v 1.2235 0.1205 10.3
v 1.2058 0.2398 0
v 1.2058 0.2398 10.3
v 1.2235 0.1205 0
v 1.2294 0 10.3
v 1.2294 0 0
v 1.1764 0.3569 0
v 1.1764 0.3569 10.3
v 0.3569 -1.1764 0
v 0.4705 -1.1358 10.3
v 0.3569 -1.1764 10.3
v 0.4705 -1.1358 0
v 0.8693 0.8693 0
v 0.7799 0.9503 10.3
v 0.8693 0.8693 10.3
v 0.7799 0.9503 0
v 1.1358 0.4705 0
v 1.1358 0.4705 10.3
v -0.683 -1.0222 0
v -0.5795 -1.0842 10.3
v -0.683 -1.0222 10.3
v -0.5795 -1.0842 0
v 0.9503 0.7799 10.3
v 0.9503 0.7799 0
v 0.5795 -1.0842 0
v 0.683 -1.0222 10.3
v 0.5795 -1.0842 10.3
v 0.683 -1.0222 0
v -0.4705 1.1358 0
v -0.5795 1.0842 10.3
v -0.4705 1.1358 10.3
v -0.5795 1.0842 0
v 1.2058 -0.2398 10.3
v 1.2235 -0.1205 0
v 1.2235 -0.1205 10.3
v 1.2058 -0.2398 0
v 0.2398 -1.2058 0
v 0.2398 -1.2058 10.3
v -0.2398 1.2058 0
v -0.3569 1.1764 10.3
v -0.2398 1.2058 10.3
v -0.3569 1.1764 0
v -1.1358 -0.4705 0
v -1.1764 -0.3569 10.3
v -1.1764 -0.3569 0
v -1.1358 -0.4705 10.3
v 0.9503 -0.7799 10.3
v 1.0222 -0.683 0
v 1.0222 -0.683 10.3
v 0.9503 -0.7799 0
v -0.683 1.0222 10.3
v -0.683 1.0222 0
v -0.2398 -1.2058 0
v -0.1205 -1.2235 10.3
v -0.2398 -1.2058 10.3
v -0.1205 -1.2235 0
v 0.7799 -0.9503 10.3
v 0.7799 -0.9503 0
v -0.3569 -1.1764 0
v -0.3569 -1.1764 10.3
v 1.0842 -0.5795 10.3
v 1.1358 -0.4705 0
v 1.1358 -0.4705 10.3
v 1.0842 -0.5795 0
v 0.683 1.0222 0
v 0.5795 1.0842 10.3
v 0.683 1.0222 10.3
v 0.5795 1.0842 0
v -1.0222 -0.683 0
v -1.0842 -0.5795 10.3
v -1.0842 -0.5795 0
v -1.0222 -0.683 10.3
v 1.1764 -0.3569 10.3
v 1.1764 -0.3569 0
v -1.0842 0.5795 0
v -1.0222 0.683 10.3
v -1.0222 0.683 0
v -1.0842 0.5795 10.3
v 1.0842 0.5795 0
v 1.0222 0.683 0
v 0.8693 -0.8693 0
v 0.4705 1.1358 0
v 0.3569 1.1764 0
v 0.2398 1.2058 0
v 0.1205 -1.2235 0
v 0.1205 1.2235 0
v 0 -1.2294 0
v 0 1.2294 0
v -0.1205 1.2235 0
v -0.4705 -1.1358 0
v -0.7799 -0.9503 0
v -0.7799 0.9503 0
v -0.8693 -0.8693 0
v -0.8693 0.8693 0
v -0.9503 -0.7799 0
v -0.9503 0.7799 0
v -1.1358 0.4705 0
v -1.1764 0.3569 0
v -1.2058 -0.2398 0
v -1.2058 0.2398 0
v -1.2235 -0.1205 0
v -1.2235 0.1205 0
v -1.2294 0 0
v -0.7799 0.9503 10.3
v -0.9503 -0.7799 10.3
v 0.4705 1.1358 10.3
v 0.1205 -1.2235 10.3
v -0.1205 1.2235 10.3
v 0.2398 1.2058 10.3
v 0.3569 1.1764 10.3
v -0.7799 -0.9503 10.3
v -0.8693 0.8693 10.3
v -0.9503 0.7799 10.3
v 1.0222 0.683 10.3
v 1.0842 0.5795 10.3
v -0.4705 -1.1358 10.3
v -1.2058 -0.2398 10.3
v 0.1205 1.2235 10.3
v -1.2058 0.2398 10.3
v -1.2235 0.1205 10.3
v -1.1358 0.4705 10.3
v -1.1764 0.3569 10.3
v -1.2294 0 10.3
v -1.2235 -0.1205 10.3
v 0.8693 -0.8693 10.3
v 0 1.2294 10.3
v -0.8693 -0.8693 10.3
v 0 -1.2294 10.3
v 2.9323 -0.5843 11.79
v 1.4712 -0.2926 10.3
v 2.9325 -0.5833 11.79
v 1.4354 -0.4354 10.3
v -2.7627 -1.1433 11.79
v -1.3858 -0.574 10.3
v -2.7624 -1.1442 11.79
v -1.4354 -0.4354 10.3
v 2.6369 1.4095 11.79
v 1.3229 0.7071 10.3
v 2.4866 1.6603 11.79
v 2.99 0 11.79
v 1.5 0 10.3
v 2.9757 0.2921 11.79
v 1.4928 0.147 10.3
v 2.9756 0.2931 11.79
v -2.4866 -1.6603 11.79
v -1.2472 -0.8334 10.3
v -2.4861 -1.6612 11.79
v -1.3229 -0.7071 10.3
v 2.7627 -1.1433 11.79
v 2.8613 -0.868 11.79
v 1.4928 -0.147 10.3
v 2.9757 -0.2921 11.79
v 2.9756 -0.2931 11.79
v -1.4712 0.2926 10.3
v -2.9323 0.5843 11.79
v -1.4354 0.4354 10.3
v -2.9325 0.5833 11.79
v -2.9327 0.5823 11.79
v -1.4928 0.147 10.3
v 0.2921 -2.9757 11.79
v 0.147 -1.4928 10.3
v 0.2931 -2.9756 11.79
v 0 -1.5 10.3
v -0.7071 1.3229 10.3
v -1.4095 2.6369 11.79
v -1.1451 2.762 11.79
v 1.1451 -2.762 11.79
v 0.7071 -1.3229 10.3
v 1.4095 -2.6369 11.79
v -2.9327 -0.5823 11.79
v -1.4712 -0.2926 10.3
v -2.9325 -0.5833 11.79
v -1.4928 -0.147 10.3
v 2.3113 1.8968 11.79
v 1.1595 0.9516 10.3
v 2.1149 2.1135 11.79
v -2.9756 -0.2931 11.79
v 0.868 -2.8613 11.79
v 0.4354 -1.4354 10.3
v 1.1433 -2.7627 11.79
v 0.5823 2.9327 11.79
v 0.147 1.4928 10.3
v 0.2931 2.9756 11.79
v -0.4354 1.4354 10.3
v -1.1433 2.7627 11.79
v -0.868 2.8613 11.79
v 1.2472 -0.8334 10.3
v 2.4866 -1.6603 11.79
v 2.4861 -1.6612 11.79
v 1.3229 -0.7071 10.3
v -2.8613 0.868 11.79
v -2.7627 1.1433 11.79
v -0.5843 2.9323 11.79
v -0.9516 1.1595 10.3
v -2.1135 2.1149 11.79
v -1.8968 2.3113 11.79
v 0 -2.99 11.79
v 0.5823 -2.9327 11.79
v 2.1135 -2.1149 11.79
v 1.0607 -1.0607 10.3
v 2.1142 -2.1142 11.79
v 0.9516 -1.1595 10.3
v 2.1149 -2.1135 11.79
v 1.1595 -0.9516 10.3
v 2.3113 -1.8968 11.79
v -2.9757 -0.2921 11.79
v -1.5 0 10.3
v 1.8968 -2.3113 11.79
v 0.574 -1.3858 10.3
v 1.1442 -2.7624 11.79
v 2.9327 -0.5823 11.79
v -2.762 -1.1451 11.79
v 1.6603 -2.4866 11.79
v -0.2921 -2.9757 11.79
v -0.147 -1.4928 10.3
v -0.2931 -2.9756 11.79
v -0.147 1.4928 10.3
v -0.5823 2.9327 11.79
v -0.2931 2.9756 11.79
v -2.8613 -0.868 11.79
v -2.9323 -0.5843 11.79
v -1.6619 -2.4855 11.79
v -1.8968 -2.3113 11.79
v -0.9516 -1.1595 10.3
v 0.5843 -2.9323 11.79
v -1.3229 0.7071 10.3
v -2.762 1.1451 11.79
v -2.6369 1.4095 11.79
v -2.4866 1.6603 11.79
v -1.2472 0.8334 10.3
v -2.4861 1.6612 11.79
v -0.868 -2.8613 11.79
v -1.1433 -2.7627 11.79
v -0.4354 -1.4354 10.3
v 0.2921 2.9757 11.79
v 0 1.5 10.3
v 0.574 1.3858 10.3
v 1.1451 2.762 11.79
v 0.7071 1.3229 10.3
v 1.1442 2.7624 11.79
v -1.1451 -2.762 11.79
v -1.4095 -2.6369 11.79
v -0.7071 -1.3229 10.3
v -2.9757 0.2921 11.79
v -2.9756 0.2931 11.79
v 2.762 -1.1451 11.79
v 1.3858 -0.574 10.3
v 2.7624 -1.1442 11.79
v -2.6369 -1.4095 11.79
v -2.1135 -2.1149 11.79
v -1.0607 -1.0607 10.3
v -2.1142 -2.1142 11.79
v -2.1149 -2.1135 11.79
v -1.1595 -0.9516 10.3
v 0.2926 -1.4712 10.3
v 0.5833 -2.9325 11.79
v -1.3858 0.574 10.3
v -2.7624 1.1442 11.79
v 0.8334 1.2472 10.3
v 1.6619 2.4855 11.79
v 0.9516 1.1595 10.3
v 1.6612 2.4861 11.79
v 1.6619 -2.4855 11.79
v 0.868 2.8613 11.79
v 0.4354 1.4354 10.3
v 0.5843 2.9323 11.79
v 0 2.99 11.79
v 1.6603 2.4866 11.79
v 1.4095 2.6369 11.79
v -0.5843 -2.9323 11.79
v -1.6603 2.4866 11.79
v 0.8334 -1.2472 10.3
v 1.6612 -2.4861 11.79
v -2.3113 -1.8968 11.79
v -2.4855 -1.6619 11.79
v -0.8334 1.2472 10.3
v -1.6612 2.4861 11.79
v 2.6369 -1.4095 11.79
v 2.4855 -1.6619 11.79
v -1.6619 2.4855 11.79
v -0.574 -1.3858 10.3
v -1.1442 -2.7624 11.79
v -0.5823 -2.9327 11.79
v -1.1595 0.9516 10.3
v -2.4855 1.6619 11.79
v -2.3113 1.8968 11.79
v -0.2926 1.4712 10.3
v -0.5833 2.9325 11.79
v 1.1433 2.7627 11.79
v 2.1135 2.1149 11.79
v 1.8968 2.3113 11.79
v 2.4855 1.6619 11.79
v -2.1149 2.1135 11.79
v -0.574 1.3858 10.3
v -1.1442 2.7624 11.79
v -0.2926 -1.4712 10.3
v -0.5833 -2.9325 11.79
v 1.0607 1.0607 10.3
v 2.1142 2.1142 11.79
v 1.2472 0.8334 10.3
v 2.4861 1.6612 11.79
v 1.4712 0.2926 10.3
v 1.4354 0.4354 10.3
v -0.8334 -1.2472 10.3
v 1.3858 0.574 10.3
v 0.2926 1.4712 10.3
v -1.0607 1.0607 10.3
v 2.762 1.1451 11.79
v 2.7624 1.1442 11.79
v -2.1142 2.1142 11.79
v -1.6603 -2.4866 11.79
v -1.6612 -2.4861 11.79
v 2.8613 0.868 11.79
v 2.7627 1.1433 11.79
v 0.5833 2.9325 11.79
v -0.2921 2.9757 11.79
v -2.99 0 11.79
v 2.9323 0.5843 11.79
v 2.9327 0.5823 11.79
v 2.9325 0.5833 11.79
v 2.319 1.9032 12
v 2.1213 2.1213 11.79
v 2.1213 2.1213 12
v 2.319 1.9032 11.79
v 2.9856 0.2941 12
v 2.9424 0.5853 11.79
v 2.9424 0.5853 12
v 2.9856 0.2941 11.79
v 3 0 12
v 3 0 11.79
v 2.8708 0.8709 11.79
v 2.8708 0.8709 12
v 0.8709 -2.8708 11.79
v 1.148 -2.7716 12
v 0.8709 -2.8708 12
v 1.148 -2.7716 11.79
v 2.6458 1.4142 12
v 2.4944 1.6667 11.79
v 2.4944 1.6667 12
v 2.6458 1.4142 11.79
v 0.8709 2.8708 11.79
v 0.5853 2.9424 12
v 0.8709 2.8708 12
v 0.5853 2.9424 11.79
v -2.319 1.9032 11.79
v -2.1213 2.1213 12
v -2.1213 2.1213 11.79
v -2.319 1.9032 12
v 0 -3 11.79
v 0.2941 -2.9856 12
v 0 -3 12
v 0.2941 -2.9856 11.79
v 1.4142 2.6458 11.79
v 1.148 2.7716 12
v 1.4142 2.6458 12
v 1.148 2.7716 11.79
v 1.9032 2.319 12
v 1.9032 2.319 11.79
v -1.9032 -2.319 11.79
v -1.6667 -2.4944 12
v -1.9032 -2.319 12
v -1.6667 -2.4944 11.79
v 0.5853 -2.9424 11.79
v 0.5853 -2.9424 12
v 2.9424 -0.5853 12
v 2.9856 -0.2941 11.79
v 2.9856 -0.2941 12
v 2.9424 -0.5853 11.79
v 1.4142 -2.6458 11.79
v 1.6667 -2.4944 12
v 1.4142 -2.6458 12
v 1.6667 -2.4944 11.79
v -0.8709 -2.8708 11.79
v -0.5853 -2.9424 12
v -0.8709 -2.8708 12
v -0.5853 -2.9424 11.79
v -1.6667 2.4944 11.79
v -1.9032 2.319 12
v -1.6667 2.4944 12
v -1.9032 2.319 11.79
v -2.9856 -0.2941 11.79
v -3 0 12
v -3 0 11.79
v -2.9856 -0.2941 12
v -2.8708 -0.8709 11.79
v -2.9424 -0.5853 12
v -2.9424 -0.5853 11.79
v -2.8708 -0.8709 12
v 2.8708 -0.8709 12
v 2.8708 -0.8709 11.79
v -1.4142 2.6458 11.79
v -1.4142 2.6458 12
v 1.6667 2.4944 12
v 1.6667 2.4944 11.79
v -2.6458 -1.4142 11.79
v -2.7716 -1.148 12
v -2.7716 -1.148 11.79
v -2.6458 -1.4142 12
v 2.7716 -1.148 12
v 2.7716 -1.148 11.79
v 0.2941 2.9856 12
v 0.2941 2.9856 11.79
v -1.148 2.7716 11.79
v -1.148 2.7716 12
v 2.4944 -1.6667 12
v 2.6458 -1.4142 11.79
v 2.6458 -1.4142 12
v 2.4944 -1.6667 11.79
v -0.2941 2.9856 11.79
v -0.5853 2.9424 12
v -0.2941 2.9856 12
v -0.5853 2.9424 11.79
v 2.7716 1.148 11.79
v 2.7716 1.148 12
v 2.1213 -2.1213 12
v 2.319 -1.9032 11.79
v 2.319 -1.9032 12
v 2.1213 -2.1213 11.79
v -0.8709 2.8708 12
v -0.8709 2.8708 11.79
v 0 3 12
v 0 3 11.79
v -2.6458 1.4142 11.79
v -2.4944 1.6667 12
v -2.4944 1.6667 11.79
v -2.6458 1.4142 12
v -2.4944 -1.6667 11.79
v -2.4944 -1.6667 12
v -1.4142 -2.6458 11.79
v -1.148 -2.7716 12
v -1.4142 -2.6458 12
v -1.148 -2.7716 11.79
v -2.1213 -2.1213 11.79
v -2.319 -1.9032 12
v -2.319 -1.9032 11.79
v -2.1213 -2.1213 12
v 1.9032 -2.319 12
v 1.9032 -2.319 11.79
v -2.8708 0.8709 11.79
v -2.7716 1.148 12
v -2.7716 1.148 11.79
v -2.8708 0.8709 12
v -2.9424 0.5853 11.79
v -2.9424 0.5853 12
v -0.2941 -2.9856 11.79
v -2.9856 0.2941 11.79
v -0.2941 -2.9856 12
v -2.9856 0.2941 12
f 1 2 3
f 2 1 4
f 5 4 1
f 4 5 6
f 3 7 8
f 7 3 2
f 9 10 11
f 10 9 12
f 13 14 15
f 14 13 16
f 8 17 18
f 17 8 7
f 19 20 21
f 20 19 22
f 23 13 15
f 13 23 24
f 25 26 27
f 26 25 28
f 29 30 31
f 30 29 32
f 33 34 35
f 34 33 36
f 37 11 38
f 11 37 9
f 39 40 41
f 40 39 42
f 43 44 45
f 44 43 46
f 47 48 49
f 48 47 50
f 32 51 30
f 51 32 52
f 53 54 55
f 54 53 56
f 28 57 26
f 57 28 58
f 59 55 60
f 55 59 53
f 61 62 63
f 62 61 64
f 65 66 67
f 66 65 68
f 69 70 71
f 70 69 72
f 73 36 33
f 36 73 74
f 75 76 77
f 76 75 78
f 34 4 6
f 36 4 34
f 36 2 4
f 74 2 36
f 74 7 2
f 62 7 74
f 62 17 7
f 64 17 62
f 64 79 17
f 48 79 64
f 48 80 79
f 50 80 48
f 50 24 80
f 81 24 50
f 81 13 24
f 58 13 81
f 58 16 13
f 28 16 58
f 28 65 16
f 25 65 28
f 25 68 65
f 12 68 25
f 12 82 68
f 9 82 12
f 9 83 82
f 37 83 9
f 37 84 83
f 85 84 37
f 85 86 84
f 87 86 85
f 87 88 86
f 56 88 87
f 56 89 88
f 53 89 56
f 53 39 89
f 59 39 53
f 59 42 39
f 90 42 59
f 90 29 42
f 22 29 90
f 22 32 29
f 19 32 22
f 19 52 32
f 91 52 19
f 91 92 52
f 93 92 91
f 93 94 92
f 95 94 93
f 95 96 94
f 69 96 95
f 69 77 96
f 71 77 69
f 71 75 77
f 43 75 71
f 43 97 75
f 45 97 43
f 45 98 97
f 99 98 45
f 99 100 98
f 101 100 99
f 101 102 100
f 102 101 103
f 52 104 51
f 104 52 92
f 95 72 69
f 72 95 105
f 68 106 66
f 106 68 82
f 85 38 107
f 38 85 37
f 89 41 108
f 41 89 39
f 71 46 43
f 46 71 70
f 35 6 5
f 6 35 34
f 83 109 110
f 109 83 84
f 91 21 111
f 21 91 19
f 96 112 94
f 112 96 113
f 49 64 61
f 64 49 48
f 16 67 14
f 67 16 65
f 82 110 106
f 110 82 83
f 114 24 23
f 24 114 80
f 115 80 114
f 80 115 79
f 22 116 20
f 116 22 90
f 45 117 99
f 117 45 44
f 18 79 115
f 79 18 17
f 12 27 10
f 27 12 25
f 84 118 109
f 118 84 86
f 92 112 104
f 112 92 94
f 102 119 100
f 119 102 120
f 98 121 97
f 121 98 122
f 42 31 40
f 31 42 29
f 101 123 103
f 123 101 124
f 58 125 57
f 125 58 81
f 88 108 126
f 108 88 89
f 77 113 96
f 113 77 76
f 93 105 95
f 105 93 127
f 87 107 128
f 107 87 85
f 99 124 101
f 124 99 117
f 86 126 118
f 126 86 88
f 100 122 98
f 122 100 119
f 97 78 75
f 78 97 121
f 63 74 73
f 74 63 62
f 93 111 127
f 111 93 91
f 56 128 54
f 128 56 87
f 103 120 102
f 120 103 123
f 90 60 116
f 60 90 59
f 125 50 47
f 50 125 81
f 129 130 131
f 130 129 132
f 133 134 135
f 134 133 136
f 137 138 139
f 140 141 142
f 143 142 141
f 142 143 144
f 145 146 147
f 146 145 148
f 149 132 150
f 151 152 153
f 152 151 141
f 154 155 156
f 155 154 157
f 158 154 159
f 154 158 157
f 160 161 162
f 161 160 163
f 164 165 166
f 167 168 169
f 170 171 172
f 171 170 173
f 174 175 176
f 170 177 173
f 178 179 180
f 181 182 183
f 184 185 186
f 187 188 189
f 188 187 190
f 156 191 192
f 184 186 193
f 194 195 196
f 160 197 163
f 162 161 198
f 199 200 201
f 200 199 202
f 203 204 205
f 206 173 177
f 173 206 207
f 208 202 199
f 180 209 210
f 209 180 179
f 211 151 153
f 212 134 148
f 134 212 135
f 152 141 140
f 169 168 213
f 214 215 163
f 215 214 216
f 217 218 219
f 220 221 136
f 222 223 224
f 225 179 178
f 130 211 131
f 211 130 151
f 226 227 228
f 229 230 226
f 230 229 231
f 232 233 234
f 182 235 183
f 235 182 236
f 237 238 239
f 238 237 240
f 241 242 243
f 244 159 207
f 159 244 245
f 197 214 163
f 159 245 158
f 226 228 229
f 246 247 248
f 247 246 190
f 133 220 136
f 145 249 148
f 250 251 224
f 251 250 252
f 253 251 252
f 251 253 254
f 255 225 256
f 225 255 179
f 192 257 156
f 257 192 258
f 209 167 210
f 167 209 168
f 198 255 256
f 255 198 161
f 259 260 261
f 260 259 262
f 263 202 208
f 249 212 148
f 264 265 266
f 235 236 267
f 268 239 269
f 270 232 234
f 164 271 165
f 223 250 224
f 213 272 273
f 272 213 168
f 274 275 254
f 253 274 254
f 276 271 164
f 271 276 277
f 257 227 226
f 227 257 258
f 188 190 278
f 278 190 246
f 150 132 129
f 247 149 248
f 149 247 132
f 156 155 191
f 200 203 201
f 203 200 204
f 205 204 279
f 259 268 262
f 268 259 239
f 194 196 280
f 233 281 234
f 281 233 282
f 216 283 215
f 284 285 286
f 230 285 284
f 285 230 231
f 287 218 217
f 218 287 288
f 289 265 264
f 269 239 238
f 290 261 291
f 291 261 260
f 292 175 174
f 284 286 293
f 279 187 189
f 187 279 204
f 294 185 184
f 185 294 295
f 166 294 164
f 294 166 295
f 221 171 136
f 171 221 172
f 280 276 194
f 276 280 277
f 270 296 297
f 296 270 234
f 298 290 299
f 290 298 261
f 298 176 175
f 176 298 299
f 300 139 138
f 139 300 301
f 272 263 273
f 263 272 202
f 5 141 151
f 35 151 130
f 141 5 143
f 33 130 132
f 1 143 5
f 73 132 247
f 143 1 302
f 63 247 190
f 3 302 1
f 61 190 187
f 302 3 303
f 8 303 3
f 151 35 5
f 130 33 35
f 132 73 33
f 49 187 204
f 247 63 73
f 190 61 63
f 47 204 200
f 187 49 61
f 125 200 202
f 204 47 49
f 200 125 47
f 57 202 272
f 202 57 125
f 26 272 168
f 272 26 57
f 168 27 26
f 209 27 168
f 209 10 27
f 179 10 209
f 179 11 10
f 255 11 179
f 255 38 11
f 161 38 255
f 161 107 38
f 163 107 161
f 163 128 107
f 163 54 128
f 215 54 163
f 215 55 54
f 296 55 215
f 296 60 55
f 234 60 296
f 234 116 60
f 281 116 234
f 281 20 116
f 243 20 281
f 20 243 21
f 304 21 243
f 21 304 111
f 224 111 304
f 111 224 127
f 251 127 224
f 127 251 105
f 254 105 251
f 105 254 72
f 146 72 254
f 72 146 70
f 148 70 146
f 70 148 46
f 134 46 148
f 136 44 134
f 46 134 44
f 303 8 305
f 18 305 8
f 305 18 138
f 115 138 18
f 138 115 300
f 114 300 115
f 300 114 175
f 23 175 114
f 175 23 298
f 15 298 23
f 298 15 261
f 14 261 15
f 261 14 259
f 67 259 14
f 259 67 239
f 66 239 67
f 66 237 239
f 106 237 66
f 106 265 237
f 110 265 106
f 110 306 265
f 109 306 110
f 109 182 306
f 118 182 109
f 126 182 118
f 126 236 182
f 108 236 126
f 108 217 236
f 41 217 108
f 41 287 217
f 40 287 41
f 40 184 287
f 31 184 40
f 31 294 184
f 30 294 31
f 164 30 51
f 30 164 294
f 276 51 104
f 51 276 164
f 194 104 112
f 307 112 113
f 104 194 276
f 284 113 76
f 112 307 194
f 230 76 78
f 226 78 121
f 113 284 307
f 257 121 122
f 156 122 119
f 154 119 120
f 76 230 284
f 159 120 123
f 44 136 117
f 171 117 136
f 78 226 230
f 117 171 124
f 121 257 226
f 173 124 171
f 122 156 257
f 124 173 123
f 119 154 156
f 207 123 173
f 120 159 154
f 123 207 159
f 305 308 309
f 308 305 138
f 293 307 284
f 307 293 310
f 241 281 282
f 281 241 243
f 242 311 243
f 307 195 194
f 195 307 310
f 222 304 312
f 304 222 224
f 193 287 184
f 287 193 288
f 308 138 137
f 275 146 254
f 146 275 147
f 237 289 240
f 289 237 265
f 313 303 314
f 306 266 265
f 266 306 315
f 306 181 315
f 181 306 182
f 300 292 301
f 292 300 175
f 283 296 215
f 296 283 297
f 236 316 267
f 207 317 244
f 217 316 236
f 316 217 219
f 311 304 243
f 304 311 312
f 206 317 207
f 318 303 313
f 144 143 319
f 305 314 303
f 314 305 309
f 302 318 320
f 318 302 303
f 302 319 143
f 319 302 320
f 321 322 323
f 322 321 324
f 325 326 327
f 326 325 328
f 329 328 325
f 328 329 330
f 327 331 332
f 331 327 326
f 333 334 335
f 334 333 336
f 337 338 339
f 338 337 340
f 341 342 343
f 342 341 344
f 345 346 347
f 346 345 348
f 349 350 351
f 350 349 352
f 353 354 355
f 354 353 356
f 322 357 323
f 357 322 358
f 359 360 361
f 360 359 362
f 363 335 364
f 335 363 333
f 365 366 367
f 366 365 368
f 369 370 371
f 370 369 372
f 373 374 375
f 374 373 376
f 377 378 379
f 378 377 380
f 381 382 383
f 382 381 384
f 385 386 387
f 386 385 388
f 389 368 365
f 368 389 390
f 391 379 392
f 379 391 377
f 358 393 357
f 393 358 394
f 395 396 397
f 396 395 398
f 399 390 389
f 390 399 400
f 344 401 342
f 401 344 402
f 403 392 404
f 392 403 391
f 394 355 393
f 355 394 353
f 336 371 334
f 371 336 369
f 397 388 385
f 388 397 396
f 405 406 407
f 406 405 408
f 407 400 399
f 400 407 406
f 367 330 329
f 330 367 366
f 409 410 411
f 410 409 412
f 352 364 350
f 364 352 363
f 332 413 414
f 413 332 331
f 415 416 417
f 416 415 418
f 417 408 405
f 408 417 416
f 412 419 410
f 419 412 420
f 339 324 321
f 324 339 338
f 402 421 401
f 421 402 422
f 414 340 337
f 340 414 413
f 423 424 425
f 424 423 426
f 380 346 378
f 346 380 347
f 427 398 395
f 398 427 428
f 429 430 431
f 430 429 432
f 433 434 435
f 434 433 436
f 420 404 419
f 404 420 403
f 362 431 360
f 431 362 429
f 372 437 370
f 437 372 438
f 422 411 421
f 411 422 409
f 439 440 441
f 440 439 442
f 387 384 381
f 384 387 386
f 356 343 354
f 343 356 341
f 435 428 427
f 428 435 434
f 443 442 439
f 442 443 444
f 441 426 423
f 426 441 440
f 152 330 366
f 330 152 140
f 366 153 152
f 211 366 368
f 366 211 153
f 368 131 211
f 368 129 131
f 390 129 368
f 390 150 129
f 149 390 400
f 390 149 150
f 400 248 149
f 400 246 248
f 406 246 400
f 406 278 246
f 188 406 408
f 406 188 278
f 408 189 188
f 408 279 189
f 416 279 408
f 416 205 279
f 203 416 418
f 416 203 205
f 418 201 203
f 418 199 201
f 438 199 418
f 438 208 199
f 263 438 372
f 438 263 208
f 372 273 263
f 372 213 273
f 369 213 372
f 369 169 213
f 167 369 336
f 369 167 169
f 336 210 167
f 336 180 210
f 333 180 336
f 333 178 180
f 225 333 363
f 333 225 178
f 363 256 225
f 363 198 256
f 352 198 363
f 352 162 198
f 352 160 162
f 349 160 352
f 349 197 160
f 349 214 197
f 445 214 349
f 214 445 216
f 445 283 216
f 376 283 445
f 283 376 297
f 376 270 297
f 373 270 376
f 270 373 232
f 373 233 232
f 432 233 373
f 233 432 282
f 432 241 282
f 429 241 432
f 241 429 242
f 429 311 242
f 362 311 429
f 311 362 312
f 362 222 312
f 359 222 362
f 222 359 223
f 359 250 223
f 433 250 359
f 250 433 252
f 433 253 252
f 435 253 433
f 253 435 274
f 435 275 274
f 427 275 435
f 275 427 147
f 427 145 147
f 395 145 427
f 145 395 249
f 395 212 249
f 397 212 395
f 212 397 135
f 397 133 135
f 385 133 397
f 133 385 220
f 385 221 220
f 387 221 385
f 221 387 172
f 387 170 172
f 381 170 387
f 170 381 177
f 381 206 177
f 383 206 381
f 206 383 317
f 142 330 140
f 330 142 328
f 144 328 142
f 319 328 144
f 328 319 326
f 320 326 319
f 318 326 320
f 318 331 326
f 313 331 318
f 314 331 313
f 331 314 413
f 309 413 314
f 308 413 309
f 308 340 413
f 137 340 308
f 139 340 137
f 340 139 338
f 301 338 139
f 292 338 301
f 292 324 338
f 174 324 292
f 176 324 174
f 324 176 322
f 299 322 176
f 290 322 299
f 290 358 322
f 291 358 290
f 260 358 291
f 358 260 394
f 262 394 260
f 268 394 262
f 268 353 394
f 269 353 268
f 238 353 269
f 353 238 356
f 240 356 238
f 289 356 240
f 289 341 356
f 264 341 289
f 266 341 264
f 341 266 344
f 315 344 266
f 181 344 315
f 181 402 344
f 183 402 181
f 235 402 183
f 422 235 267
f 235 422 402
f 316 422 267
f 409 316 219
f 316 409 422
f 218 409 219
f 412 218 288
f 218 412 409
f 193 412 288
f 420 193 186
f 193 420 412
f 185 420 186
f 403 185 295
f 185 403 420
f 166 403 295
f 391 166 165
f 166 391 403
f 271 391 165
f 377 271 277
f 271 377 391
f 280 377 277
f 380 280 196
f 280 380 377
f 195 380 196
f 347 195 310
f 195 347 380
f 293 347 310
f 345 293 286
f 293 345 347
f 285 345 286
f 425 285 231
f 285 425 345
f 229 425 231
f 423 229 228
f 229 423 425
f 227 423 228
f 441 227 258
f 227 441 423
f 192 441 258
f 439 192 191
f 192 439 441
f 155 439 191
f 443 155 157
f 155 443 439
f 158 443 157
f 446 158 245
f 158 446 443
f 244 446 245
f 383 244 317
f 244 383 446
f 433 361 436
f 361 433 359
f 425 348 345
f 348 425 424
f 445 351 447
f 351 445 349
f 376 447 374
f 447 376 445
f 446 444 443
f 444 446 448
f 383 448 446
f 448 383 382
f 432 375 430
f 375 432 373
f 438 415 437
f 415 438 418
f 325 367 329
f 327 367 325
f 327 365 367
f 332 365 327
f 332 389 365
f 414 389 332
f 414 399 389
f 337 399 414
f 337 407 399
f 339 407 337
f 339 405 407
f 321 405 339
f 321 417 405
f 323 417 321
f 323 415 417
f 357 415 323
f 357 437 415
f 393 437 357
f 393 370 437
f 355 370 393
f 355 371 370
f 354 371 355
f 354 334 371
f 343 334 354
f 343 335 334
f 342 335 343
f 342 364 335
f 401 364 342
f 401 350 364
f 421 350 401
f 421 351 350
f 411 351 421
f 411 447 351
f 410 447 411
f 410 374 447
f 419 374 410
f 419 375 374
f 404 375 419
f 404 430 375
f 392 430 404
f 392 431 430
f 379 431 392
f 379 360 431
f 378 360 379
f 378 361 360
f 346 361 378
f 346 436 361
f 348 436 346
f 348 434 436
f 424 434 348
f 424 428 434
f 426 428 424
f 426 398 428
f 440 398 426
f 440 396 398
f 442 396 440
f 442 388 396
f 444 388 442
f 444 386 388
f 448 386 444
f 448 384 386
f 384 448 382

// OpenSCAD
// A screw of the parts library (packages/contracts/src/parts/screws.ts), at the sizes given as -D overrides. `npm run
// check:assembly` renders it to check the screws a model holds (e.g. the litter shovel's handle reinforcement). The thread is
// drawn as a plain shank at its minor diameter (ISO 68-1: d - 1.0825 P), so that it clears the bore of the nut or insert it
// turns into, which is drawn at the thread's diameter; the head is drawn at its greatest size.
// Frame: millimetres, as the parts library's preview: the tip on z = 0, the axis along Z, the head up. A countersunk screw's
// length includes its head (a 90 degree cone from the thread up to the head's diameter, then its cylindrical edge); any other
// head (HEAD_D x HEAD_K) sits on top of the length.

COUNTERSUNK = true;
D = 3;
PITCH = 0.5;
L = 12;
HEAD_D = 6;
HEAD_K = 1.7;

$fn = 64;
MINOR = D - 1.0825 * PITCH;

if (COUNTERSUNK) {
  cone = (HEAD_D - D) / 2;
  cylinder(d = MINOR, h = L - HEAD_K + 0.01);
  translate([0, 0, L - HEAD_K]) cylinder(d1 = D, d2 = HEAD_D, h = min(cone, HEAD_K));
  if (HEAD_K > cone) translate([0, 0, L - HEAD_K + cone - 0.01]) cylinder(d = HEAD_D, h = HEAD_K - cone + 0.01);
} else {
  cylinder(d = MINOR, h = L + 0.01);
  translate([0, 0, L]) cylinder(d = HEAD_D, h = HEAD_K);
}
